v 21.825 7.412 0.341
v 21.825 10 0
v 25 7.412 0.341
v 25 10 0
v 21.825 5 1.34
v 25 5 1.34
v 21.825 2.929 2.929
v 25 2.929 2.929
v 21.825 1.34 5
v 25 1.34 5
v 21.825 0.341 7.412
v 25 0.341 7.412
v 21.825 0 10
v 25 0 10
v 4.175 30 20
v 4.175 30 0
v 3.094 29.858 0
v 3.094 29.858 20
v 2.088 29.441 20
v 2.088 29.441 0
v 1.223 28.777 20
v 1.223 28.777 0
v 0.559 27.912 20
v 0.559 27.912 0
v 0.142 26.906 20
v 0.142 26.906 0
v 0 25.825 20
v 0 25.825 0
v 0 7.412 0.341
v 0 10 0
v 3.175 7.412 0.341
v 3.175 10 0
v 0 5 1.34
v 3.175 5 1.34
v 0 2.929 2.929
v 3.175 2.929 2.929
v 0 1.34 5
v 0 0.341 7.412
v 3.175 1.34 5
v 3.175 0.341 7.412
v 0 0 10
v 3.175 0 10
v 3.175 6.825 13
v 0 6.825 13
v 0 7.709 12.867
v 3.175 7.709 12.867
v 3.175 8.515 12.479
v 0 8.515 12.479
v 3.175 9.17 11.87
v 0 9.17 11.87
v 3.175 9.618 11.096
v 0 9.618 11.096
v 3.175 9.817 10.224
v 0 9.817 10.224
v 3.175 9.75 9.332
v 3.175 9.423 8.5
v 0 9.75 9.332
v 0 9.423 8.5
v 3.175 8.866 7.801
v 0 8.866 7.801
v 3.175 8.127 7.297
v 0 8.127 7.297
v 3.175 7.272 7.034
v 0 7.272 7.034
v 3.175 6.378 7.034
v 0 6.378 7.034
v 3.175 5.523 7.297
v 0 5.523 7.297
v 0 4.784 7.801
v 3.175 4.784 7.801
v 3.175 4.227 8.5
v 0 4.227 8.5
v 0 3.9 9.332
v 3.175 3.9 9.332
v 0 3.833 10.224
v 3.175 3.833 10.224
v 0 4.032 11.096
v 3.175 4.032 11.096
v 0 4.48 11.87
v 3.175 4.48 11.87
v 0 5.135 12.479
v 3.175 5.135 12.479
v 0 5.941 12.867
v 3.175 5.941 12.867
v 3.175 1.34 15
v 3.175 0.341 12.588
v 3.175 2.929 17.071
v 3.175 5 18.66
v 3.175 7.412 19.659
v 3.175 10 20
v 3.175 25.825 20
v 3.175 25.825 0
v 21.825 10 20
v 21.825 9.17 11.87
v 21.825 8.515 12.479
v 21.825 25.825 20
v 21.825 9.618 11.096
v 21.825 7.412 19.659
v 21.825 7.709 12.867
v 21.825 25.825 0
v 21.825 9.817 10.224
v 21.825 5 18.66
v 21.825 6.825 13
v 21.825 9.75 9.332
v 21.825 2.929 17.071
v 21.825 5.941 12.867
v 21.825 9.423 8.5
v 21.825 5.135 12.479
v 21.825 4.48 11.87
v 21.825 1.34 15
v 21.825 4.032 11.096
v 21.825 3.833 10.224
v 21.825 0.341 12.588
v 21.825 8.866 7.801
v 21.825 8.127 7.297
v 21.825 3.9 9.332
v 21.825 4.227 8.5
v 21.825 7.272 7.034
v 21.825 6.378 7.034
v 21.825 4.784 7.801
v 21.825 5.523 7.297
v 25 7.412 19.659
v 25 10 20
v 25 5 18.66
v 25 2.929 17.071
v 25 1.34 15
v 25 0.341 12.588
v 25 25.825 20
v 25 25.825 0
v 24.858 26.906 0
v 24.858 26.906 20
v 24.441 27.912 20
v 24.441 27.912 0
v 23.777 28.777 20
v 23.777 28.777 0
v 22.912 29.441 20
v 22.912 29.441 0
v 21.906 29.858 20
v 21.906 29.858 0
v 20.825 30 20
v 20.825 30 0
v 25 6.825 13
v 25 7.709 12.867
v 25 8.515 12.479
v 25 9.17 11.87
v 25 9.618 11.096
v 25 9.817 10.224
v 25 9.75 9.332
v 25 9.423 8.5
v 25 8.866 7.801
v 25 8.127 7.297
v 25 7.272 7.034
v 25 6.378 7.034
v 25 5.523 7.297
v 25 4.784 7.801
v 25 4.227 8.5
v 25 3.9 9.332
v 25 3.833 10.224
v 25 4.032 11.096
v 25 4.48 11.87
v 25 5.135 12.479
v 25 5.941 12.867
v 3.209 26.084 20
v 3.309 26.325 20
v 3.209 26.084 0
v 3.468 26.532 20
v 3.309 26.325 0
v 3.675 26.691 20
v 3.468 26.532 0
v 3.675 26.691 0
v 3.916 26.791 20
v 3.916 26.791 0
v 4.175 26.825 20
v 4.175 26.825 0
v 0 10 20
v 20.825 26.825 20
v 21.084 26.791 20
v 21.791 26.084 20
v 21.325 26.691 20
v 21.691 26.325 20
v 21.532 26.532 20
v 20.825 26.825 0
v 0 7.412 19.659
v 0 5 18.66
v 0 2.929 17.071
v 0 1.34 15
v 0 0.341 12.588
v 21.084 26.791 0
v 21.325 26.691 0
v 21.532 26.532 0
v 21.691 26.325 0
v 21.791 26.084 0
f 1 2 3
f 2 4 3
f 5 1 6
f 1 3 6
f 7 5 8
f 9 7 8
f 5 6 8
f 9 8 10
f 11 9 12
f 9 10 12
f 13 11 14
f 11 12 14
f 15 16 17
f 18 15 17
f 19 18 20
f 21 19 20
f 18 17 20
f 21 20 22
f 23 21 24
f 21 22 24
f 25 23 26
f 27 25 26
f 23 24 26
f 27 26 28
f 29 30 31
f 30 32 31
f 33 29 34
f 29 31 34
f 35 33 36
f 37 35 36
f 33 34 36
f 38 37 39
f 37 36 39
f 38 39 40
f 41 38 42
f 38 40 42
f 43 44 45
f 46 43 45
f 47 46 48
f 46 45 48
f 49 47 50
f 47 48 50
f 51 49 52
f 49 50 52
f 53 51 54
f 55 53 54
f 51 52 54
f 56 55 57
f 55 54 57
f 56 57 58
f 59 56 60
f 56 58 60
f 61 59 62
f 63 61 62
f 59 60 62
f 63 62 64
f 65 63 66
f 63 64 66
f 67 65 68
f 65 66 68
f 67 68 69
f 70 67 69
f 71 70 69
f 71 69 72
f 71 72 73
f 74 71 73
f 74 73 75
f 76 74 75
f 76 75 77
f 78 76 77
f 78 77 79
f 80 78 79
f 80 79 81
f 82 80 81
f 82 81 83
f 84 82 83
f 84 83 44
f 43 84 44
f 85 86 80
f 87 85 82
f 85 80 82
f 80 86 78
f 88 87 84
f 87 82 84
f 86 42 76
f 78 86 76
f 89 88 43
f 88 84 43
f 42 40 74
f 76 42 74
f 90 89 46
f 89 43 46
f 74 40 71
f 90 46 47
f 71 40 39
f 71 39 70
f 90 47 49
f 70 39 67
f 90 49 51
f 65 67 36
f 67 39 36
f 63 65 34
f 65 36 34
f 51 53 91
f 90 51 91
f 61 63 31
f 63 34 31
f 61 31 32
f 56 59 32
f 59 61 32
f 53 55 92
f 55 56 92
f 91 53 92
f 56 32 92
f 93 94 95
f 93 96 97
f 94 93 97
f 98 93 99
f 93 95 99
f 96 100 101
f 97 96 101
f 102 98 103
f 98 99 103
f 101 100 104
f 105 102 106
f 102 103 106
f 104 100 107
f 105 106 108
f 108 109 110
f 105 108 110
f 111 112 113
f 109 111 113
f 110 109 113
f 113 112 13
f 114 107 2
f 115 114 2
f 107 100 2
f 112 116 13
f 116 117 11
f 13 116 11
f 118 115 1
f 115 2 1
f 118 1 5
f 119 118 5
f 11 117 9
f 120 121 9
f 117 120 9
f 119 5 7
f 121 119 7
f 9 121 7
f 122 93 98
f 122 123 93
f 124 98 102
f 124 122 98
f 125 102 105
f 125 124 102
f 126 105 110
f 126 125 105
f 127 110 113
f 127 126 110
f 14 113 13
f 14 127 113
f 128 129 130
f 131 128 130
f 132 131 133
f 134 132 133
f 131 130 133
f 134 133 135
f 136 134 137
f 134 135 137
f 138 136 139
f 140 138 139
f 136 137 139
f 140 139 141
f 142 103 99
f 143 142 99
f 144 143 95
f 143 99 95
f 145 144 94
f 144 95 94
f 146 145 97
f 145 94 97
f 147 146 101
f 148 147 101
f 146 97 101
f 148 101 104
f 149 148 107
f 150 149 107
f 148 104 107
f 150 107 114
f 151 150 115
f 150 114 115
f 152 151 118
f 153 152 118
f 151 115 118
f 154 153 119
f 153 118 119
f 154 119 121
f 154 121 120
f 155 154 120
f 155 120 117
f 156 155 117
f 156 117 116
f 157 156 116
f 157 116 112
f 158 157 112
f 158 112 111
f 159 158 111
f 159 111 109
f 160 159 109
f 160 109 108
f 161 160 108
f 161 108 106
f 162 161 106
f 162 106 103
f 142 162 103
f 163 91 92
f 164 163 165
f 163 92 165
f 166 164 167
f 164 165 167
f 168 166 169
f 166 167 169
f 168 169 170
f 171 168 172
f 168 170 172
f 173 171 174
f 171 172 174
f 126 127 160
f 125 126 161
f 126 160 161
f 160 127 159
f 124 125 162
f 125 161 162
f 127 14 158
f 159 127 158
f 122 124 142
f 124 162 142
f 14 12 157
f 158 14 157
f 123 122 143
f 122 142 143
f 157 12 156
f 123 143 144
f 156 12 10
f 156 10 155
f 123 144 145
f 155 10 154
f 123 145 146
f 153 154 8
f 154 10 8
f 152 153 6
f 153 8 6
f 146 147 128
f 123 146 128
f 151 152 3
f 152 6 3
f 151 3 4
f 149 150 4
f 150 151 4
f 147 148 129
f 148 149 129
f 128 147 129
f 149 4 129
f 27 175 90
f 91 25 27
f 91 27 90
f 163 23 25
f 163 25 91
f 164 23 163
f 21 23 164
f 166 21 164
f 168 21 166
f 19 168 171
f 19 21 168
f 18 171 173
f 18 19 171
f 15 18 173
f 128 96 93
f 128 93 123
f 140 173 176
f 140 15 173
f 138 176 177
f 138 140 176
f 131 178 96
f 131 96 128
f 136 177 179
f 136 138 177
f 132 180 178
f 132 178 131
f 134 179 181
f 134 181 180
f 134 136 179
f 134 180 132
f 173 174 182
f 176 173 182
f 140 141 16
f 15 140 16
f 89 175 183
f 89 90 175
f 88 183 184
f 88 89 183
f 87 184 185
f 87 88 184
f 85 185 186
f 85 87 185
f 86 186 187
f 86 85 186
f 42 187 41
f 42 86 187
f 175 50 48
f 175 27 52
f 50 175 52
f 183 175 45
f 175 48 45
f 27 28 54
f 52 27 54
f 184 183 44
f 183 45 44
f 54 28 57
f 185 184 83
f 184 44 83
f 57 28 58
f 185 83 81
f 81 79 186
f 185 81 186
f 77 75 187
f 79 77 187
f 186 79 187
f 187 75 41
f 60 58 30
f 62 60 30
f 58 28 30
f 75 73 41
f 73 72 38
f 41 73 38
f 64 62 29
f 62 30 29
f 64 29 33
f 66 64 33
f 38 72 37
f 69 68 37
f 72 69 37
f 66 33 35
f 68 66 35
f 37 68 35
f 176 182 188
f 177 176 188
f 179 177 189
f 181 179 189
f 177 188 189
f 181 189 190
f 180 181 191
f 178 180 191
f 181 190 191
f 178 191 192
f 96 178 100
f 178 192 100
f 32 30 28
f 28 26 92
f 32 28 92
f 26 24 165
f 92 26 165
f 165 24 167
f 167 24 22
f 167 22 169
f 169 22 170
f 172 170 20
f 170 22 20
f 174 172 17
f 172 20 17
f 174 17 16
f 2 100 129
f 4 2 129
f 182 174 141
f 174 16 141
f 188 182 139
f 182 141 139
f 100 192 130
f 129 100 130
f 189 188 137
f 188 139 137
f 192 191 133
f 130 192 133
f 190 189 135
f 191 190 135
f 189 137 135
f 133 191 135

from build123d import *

# Parameters (mm, degrees)
BASE_FLANGE1_DEPTH = 20
SKETCH6_R          = 3
CUT_EXTRUDE1_DEPTH = 44.874821937
FILLET1_R          = 10


# Read off the part's stored shape, not the designer's step: Base-Flange1
with BuildPart() as part:
    # Base-Flange1 outline → Base-Flange1 (new body)
    with BuildSketch(Plane.XY):
        with BuildLine():
            Line((21.825, 25.825), (21.825, 0))
            Line((21.825, 0), (25, 0))
            Line((25, 0), (25, 25.825))
            ThreePointArc((25, 25.825), (23.777170811, 28.777170811), (20.825, 30))
            Line((20.825, 30), (4.175, 30))
            ThreePointArc((4.175, 30), (1.222829189, 28.777170811), (0, 25.825))
            Line((0, 25.825), (0, 0))
            Line((0, 0), (3.175, 0))
            Line((3.175, 0), (3.175, 25.825))
            ThreePointArc((3.175, 25.825), (3.467893219, 26.532106781), (4.175, 26.825))
            Line((4.175, 26.825), (20.825, 26.825))
            ThreePointArc((20.825, 26.825), (21.532106781, 26.532106781), (21.825, 25.825))
        make_face()
    extrude(amount=BASE_FLANGE1_DEPTH)

    # Sketch6 → Cut-Extrude1 (cut, through all)
    with BuildSketch(Plane.ZY):
        with Locations((10, 6.825)):
            Circle(SKETCH6_R)
    extrude(amount=-CUT_EXTRUDE1_DEPTH, mode=Mode.SUBTRACT)

    # Fillet1
    fillet1_edges = [part.edges().sort_by_distance(p)[0] for p in [
        (23.4125, 0, 20),
        (23.4125, 0, 0),
        (1.5875, 0, 0),
        (1.5875, 0, 20),
    ]]
    fillet(fillet1_edges, radius=FILLET1_R - 0.0001)  # a hair under: the kernel refuses the full size


solid = part.part
